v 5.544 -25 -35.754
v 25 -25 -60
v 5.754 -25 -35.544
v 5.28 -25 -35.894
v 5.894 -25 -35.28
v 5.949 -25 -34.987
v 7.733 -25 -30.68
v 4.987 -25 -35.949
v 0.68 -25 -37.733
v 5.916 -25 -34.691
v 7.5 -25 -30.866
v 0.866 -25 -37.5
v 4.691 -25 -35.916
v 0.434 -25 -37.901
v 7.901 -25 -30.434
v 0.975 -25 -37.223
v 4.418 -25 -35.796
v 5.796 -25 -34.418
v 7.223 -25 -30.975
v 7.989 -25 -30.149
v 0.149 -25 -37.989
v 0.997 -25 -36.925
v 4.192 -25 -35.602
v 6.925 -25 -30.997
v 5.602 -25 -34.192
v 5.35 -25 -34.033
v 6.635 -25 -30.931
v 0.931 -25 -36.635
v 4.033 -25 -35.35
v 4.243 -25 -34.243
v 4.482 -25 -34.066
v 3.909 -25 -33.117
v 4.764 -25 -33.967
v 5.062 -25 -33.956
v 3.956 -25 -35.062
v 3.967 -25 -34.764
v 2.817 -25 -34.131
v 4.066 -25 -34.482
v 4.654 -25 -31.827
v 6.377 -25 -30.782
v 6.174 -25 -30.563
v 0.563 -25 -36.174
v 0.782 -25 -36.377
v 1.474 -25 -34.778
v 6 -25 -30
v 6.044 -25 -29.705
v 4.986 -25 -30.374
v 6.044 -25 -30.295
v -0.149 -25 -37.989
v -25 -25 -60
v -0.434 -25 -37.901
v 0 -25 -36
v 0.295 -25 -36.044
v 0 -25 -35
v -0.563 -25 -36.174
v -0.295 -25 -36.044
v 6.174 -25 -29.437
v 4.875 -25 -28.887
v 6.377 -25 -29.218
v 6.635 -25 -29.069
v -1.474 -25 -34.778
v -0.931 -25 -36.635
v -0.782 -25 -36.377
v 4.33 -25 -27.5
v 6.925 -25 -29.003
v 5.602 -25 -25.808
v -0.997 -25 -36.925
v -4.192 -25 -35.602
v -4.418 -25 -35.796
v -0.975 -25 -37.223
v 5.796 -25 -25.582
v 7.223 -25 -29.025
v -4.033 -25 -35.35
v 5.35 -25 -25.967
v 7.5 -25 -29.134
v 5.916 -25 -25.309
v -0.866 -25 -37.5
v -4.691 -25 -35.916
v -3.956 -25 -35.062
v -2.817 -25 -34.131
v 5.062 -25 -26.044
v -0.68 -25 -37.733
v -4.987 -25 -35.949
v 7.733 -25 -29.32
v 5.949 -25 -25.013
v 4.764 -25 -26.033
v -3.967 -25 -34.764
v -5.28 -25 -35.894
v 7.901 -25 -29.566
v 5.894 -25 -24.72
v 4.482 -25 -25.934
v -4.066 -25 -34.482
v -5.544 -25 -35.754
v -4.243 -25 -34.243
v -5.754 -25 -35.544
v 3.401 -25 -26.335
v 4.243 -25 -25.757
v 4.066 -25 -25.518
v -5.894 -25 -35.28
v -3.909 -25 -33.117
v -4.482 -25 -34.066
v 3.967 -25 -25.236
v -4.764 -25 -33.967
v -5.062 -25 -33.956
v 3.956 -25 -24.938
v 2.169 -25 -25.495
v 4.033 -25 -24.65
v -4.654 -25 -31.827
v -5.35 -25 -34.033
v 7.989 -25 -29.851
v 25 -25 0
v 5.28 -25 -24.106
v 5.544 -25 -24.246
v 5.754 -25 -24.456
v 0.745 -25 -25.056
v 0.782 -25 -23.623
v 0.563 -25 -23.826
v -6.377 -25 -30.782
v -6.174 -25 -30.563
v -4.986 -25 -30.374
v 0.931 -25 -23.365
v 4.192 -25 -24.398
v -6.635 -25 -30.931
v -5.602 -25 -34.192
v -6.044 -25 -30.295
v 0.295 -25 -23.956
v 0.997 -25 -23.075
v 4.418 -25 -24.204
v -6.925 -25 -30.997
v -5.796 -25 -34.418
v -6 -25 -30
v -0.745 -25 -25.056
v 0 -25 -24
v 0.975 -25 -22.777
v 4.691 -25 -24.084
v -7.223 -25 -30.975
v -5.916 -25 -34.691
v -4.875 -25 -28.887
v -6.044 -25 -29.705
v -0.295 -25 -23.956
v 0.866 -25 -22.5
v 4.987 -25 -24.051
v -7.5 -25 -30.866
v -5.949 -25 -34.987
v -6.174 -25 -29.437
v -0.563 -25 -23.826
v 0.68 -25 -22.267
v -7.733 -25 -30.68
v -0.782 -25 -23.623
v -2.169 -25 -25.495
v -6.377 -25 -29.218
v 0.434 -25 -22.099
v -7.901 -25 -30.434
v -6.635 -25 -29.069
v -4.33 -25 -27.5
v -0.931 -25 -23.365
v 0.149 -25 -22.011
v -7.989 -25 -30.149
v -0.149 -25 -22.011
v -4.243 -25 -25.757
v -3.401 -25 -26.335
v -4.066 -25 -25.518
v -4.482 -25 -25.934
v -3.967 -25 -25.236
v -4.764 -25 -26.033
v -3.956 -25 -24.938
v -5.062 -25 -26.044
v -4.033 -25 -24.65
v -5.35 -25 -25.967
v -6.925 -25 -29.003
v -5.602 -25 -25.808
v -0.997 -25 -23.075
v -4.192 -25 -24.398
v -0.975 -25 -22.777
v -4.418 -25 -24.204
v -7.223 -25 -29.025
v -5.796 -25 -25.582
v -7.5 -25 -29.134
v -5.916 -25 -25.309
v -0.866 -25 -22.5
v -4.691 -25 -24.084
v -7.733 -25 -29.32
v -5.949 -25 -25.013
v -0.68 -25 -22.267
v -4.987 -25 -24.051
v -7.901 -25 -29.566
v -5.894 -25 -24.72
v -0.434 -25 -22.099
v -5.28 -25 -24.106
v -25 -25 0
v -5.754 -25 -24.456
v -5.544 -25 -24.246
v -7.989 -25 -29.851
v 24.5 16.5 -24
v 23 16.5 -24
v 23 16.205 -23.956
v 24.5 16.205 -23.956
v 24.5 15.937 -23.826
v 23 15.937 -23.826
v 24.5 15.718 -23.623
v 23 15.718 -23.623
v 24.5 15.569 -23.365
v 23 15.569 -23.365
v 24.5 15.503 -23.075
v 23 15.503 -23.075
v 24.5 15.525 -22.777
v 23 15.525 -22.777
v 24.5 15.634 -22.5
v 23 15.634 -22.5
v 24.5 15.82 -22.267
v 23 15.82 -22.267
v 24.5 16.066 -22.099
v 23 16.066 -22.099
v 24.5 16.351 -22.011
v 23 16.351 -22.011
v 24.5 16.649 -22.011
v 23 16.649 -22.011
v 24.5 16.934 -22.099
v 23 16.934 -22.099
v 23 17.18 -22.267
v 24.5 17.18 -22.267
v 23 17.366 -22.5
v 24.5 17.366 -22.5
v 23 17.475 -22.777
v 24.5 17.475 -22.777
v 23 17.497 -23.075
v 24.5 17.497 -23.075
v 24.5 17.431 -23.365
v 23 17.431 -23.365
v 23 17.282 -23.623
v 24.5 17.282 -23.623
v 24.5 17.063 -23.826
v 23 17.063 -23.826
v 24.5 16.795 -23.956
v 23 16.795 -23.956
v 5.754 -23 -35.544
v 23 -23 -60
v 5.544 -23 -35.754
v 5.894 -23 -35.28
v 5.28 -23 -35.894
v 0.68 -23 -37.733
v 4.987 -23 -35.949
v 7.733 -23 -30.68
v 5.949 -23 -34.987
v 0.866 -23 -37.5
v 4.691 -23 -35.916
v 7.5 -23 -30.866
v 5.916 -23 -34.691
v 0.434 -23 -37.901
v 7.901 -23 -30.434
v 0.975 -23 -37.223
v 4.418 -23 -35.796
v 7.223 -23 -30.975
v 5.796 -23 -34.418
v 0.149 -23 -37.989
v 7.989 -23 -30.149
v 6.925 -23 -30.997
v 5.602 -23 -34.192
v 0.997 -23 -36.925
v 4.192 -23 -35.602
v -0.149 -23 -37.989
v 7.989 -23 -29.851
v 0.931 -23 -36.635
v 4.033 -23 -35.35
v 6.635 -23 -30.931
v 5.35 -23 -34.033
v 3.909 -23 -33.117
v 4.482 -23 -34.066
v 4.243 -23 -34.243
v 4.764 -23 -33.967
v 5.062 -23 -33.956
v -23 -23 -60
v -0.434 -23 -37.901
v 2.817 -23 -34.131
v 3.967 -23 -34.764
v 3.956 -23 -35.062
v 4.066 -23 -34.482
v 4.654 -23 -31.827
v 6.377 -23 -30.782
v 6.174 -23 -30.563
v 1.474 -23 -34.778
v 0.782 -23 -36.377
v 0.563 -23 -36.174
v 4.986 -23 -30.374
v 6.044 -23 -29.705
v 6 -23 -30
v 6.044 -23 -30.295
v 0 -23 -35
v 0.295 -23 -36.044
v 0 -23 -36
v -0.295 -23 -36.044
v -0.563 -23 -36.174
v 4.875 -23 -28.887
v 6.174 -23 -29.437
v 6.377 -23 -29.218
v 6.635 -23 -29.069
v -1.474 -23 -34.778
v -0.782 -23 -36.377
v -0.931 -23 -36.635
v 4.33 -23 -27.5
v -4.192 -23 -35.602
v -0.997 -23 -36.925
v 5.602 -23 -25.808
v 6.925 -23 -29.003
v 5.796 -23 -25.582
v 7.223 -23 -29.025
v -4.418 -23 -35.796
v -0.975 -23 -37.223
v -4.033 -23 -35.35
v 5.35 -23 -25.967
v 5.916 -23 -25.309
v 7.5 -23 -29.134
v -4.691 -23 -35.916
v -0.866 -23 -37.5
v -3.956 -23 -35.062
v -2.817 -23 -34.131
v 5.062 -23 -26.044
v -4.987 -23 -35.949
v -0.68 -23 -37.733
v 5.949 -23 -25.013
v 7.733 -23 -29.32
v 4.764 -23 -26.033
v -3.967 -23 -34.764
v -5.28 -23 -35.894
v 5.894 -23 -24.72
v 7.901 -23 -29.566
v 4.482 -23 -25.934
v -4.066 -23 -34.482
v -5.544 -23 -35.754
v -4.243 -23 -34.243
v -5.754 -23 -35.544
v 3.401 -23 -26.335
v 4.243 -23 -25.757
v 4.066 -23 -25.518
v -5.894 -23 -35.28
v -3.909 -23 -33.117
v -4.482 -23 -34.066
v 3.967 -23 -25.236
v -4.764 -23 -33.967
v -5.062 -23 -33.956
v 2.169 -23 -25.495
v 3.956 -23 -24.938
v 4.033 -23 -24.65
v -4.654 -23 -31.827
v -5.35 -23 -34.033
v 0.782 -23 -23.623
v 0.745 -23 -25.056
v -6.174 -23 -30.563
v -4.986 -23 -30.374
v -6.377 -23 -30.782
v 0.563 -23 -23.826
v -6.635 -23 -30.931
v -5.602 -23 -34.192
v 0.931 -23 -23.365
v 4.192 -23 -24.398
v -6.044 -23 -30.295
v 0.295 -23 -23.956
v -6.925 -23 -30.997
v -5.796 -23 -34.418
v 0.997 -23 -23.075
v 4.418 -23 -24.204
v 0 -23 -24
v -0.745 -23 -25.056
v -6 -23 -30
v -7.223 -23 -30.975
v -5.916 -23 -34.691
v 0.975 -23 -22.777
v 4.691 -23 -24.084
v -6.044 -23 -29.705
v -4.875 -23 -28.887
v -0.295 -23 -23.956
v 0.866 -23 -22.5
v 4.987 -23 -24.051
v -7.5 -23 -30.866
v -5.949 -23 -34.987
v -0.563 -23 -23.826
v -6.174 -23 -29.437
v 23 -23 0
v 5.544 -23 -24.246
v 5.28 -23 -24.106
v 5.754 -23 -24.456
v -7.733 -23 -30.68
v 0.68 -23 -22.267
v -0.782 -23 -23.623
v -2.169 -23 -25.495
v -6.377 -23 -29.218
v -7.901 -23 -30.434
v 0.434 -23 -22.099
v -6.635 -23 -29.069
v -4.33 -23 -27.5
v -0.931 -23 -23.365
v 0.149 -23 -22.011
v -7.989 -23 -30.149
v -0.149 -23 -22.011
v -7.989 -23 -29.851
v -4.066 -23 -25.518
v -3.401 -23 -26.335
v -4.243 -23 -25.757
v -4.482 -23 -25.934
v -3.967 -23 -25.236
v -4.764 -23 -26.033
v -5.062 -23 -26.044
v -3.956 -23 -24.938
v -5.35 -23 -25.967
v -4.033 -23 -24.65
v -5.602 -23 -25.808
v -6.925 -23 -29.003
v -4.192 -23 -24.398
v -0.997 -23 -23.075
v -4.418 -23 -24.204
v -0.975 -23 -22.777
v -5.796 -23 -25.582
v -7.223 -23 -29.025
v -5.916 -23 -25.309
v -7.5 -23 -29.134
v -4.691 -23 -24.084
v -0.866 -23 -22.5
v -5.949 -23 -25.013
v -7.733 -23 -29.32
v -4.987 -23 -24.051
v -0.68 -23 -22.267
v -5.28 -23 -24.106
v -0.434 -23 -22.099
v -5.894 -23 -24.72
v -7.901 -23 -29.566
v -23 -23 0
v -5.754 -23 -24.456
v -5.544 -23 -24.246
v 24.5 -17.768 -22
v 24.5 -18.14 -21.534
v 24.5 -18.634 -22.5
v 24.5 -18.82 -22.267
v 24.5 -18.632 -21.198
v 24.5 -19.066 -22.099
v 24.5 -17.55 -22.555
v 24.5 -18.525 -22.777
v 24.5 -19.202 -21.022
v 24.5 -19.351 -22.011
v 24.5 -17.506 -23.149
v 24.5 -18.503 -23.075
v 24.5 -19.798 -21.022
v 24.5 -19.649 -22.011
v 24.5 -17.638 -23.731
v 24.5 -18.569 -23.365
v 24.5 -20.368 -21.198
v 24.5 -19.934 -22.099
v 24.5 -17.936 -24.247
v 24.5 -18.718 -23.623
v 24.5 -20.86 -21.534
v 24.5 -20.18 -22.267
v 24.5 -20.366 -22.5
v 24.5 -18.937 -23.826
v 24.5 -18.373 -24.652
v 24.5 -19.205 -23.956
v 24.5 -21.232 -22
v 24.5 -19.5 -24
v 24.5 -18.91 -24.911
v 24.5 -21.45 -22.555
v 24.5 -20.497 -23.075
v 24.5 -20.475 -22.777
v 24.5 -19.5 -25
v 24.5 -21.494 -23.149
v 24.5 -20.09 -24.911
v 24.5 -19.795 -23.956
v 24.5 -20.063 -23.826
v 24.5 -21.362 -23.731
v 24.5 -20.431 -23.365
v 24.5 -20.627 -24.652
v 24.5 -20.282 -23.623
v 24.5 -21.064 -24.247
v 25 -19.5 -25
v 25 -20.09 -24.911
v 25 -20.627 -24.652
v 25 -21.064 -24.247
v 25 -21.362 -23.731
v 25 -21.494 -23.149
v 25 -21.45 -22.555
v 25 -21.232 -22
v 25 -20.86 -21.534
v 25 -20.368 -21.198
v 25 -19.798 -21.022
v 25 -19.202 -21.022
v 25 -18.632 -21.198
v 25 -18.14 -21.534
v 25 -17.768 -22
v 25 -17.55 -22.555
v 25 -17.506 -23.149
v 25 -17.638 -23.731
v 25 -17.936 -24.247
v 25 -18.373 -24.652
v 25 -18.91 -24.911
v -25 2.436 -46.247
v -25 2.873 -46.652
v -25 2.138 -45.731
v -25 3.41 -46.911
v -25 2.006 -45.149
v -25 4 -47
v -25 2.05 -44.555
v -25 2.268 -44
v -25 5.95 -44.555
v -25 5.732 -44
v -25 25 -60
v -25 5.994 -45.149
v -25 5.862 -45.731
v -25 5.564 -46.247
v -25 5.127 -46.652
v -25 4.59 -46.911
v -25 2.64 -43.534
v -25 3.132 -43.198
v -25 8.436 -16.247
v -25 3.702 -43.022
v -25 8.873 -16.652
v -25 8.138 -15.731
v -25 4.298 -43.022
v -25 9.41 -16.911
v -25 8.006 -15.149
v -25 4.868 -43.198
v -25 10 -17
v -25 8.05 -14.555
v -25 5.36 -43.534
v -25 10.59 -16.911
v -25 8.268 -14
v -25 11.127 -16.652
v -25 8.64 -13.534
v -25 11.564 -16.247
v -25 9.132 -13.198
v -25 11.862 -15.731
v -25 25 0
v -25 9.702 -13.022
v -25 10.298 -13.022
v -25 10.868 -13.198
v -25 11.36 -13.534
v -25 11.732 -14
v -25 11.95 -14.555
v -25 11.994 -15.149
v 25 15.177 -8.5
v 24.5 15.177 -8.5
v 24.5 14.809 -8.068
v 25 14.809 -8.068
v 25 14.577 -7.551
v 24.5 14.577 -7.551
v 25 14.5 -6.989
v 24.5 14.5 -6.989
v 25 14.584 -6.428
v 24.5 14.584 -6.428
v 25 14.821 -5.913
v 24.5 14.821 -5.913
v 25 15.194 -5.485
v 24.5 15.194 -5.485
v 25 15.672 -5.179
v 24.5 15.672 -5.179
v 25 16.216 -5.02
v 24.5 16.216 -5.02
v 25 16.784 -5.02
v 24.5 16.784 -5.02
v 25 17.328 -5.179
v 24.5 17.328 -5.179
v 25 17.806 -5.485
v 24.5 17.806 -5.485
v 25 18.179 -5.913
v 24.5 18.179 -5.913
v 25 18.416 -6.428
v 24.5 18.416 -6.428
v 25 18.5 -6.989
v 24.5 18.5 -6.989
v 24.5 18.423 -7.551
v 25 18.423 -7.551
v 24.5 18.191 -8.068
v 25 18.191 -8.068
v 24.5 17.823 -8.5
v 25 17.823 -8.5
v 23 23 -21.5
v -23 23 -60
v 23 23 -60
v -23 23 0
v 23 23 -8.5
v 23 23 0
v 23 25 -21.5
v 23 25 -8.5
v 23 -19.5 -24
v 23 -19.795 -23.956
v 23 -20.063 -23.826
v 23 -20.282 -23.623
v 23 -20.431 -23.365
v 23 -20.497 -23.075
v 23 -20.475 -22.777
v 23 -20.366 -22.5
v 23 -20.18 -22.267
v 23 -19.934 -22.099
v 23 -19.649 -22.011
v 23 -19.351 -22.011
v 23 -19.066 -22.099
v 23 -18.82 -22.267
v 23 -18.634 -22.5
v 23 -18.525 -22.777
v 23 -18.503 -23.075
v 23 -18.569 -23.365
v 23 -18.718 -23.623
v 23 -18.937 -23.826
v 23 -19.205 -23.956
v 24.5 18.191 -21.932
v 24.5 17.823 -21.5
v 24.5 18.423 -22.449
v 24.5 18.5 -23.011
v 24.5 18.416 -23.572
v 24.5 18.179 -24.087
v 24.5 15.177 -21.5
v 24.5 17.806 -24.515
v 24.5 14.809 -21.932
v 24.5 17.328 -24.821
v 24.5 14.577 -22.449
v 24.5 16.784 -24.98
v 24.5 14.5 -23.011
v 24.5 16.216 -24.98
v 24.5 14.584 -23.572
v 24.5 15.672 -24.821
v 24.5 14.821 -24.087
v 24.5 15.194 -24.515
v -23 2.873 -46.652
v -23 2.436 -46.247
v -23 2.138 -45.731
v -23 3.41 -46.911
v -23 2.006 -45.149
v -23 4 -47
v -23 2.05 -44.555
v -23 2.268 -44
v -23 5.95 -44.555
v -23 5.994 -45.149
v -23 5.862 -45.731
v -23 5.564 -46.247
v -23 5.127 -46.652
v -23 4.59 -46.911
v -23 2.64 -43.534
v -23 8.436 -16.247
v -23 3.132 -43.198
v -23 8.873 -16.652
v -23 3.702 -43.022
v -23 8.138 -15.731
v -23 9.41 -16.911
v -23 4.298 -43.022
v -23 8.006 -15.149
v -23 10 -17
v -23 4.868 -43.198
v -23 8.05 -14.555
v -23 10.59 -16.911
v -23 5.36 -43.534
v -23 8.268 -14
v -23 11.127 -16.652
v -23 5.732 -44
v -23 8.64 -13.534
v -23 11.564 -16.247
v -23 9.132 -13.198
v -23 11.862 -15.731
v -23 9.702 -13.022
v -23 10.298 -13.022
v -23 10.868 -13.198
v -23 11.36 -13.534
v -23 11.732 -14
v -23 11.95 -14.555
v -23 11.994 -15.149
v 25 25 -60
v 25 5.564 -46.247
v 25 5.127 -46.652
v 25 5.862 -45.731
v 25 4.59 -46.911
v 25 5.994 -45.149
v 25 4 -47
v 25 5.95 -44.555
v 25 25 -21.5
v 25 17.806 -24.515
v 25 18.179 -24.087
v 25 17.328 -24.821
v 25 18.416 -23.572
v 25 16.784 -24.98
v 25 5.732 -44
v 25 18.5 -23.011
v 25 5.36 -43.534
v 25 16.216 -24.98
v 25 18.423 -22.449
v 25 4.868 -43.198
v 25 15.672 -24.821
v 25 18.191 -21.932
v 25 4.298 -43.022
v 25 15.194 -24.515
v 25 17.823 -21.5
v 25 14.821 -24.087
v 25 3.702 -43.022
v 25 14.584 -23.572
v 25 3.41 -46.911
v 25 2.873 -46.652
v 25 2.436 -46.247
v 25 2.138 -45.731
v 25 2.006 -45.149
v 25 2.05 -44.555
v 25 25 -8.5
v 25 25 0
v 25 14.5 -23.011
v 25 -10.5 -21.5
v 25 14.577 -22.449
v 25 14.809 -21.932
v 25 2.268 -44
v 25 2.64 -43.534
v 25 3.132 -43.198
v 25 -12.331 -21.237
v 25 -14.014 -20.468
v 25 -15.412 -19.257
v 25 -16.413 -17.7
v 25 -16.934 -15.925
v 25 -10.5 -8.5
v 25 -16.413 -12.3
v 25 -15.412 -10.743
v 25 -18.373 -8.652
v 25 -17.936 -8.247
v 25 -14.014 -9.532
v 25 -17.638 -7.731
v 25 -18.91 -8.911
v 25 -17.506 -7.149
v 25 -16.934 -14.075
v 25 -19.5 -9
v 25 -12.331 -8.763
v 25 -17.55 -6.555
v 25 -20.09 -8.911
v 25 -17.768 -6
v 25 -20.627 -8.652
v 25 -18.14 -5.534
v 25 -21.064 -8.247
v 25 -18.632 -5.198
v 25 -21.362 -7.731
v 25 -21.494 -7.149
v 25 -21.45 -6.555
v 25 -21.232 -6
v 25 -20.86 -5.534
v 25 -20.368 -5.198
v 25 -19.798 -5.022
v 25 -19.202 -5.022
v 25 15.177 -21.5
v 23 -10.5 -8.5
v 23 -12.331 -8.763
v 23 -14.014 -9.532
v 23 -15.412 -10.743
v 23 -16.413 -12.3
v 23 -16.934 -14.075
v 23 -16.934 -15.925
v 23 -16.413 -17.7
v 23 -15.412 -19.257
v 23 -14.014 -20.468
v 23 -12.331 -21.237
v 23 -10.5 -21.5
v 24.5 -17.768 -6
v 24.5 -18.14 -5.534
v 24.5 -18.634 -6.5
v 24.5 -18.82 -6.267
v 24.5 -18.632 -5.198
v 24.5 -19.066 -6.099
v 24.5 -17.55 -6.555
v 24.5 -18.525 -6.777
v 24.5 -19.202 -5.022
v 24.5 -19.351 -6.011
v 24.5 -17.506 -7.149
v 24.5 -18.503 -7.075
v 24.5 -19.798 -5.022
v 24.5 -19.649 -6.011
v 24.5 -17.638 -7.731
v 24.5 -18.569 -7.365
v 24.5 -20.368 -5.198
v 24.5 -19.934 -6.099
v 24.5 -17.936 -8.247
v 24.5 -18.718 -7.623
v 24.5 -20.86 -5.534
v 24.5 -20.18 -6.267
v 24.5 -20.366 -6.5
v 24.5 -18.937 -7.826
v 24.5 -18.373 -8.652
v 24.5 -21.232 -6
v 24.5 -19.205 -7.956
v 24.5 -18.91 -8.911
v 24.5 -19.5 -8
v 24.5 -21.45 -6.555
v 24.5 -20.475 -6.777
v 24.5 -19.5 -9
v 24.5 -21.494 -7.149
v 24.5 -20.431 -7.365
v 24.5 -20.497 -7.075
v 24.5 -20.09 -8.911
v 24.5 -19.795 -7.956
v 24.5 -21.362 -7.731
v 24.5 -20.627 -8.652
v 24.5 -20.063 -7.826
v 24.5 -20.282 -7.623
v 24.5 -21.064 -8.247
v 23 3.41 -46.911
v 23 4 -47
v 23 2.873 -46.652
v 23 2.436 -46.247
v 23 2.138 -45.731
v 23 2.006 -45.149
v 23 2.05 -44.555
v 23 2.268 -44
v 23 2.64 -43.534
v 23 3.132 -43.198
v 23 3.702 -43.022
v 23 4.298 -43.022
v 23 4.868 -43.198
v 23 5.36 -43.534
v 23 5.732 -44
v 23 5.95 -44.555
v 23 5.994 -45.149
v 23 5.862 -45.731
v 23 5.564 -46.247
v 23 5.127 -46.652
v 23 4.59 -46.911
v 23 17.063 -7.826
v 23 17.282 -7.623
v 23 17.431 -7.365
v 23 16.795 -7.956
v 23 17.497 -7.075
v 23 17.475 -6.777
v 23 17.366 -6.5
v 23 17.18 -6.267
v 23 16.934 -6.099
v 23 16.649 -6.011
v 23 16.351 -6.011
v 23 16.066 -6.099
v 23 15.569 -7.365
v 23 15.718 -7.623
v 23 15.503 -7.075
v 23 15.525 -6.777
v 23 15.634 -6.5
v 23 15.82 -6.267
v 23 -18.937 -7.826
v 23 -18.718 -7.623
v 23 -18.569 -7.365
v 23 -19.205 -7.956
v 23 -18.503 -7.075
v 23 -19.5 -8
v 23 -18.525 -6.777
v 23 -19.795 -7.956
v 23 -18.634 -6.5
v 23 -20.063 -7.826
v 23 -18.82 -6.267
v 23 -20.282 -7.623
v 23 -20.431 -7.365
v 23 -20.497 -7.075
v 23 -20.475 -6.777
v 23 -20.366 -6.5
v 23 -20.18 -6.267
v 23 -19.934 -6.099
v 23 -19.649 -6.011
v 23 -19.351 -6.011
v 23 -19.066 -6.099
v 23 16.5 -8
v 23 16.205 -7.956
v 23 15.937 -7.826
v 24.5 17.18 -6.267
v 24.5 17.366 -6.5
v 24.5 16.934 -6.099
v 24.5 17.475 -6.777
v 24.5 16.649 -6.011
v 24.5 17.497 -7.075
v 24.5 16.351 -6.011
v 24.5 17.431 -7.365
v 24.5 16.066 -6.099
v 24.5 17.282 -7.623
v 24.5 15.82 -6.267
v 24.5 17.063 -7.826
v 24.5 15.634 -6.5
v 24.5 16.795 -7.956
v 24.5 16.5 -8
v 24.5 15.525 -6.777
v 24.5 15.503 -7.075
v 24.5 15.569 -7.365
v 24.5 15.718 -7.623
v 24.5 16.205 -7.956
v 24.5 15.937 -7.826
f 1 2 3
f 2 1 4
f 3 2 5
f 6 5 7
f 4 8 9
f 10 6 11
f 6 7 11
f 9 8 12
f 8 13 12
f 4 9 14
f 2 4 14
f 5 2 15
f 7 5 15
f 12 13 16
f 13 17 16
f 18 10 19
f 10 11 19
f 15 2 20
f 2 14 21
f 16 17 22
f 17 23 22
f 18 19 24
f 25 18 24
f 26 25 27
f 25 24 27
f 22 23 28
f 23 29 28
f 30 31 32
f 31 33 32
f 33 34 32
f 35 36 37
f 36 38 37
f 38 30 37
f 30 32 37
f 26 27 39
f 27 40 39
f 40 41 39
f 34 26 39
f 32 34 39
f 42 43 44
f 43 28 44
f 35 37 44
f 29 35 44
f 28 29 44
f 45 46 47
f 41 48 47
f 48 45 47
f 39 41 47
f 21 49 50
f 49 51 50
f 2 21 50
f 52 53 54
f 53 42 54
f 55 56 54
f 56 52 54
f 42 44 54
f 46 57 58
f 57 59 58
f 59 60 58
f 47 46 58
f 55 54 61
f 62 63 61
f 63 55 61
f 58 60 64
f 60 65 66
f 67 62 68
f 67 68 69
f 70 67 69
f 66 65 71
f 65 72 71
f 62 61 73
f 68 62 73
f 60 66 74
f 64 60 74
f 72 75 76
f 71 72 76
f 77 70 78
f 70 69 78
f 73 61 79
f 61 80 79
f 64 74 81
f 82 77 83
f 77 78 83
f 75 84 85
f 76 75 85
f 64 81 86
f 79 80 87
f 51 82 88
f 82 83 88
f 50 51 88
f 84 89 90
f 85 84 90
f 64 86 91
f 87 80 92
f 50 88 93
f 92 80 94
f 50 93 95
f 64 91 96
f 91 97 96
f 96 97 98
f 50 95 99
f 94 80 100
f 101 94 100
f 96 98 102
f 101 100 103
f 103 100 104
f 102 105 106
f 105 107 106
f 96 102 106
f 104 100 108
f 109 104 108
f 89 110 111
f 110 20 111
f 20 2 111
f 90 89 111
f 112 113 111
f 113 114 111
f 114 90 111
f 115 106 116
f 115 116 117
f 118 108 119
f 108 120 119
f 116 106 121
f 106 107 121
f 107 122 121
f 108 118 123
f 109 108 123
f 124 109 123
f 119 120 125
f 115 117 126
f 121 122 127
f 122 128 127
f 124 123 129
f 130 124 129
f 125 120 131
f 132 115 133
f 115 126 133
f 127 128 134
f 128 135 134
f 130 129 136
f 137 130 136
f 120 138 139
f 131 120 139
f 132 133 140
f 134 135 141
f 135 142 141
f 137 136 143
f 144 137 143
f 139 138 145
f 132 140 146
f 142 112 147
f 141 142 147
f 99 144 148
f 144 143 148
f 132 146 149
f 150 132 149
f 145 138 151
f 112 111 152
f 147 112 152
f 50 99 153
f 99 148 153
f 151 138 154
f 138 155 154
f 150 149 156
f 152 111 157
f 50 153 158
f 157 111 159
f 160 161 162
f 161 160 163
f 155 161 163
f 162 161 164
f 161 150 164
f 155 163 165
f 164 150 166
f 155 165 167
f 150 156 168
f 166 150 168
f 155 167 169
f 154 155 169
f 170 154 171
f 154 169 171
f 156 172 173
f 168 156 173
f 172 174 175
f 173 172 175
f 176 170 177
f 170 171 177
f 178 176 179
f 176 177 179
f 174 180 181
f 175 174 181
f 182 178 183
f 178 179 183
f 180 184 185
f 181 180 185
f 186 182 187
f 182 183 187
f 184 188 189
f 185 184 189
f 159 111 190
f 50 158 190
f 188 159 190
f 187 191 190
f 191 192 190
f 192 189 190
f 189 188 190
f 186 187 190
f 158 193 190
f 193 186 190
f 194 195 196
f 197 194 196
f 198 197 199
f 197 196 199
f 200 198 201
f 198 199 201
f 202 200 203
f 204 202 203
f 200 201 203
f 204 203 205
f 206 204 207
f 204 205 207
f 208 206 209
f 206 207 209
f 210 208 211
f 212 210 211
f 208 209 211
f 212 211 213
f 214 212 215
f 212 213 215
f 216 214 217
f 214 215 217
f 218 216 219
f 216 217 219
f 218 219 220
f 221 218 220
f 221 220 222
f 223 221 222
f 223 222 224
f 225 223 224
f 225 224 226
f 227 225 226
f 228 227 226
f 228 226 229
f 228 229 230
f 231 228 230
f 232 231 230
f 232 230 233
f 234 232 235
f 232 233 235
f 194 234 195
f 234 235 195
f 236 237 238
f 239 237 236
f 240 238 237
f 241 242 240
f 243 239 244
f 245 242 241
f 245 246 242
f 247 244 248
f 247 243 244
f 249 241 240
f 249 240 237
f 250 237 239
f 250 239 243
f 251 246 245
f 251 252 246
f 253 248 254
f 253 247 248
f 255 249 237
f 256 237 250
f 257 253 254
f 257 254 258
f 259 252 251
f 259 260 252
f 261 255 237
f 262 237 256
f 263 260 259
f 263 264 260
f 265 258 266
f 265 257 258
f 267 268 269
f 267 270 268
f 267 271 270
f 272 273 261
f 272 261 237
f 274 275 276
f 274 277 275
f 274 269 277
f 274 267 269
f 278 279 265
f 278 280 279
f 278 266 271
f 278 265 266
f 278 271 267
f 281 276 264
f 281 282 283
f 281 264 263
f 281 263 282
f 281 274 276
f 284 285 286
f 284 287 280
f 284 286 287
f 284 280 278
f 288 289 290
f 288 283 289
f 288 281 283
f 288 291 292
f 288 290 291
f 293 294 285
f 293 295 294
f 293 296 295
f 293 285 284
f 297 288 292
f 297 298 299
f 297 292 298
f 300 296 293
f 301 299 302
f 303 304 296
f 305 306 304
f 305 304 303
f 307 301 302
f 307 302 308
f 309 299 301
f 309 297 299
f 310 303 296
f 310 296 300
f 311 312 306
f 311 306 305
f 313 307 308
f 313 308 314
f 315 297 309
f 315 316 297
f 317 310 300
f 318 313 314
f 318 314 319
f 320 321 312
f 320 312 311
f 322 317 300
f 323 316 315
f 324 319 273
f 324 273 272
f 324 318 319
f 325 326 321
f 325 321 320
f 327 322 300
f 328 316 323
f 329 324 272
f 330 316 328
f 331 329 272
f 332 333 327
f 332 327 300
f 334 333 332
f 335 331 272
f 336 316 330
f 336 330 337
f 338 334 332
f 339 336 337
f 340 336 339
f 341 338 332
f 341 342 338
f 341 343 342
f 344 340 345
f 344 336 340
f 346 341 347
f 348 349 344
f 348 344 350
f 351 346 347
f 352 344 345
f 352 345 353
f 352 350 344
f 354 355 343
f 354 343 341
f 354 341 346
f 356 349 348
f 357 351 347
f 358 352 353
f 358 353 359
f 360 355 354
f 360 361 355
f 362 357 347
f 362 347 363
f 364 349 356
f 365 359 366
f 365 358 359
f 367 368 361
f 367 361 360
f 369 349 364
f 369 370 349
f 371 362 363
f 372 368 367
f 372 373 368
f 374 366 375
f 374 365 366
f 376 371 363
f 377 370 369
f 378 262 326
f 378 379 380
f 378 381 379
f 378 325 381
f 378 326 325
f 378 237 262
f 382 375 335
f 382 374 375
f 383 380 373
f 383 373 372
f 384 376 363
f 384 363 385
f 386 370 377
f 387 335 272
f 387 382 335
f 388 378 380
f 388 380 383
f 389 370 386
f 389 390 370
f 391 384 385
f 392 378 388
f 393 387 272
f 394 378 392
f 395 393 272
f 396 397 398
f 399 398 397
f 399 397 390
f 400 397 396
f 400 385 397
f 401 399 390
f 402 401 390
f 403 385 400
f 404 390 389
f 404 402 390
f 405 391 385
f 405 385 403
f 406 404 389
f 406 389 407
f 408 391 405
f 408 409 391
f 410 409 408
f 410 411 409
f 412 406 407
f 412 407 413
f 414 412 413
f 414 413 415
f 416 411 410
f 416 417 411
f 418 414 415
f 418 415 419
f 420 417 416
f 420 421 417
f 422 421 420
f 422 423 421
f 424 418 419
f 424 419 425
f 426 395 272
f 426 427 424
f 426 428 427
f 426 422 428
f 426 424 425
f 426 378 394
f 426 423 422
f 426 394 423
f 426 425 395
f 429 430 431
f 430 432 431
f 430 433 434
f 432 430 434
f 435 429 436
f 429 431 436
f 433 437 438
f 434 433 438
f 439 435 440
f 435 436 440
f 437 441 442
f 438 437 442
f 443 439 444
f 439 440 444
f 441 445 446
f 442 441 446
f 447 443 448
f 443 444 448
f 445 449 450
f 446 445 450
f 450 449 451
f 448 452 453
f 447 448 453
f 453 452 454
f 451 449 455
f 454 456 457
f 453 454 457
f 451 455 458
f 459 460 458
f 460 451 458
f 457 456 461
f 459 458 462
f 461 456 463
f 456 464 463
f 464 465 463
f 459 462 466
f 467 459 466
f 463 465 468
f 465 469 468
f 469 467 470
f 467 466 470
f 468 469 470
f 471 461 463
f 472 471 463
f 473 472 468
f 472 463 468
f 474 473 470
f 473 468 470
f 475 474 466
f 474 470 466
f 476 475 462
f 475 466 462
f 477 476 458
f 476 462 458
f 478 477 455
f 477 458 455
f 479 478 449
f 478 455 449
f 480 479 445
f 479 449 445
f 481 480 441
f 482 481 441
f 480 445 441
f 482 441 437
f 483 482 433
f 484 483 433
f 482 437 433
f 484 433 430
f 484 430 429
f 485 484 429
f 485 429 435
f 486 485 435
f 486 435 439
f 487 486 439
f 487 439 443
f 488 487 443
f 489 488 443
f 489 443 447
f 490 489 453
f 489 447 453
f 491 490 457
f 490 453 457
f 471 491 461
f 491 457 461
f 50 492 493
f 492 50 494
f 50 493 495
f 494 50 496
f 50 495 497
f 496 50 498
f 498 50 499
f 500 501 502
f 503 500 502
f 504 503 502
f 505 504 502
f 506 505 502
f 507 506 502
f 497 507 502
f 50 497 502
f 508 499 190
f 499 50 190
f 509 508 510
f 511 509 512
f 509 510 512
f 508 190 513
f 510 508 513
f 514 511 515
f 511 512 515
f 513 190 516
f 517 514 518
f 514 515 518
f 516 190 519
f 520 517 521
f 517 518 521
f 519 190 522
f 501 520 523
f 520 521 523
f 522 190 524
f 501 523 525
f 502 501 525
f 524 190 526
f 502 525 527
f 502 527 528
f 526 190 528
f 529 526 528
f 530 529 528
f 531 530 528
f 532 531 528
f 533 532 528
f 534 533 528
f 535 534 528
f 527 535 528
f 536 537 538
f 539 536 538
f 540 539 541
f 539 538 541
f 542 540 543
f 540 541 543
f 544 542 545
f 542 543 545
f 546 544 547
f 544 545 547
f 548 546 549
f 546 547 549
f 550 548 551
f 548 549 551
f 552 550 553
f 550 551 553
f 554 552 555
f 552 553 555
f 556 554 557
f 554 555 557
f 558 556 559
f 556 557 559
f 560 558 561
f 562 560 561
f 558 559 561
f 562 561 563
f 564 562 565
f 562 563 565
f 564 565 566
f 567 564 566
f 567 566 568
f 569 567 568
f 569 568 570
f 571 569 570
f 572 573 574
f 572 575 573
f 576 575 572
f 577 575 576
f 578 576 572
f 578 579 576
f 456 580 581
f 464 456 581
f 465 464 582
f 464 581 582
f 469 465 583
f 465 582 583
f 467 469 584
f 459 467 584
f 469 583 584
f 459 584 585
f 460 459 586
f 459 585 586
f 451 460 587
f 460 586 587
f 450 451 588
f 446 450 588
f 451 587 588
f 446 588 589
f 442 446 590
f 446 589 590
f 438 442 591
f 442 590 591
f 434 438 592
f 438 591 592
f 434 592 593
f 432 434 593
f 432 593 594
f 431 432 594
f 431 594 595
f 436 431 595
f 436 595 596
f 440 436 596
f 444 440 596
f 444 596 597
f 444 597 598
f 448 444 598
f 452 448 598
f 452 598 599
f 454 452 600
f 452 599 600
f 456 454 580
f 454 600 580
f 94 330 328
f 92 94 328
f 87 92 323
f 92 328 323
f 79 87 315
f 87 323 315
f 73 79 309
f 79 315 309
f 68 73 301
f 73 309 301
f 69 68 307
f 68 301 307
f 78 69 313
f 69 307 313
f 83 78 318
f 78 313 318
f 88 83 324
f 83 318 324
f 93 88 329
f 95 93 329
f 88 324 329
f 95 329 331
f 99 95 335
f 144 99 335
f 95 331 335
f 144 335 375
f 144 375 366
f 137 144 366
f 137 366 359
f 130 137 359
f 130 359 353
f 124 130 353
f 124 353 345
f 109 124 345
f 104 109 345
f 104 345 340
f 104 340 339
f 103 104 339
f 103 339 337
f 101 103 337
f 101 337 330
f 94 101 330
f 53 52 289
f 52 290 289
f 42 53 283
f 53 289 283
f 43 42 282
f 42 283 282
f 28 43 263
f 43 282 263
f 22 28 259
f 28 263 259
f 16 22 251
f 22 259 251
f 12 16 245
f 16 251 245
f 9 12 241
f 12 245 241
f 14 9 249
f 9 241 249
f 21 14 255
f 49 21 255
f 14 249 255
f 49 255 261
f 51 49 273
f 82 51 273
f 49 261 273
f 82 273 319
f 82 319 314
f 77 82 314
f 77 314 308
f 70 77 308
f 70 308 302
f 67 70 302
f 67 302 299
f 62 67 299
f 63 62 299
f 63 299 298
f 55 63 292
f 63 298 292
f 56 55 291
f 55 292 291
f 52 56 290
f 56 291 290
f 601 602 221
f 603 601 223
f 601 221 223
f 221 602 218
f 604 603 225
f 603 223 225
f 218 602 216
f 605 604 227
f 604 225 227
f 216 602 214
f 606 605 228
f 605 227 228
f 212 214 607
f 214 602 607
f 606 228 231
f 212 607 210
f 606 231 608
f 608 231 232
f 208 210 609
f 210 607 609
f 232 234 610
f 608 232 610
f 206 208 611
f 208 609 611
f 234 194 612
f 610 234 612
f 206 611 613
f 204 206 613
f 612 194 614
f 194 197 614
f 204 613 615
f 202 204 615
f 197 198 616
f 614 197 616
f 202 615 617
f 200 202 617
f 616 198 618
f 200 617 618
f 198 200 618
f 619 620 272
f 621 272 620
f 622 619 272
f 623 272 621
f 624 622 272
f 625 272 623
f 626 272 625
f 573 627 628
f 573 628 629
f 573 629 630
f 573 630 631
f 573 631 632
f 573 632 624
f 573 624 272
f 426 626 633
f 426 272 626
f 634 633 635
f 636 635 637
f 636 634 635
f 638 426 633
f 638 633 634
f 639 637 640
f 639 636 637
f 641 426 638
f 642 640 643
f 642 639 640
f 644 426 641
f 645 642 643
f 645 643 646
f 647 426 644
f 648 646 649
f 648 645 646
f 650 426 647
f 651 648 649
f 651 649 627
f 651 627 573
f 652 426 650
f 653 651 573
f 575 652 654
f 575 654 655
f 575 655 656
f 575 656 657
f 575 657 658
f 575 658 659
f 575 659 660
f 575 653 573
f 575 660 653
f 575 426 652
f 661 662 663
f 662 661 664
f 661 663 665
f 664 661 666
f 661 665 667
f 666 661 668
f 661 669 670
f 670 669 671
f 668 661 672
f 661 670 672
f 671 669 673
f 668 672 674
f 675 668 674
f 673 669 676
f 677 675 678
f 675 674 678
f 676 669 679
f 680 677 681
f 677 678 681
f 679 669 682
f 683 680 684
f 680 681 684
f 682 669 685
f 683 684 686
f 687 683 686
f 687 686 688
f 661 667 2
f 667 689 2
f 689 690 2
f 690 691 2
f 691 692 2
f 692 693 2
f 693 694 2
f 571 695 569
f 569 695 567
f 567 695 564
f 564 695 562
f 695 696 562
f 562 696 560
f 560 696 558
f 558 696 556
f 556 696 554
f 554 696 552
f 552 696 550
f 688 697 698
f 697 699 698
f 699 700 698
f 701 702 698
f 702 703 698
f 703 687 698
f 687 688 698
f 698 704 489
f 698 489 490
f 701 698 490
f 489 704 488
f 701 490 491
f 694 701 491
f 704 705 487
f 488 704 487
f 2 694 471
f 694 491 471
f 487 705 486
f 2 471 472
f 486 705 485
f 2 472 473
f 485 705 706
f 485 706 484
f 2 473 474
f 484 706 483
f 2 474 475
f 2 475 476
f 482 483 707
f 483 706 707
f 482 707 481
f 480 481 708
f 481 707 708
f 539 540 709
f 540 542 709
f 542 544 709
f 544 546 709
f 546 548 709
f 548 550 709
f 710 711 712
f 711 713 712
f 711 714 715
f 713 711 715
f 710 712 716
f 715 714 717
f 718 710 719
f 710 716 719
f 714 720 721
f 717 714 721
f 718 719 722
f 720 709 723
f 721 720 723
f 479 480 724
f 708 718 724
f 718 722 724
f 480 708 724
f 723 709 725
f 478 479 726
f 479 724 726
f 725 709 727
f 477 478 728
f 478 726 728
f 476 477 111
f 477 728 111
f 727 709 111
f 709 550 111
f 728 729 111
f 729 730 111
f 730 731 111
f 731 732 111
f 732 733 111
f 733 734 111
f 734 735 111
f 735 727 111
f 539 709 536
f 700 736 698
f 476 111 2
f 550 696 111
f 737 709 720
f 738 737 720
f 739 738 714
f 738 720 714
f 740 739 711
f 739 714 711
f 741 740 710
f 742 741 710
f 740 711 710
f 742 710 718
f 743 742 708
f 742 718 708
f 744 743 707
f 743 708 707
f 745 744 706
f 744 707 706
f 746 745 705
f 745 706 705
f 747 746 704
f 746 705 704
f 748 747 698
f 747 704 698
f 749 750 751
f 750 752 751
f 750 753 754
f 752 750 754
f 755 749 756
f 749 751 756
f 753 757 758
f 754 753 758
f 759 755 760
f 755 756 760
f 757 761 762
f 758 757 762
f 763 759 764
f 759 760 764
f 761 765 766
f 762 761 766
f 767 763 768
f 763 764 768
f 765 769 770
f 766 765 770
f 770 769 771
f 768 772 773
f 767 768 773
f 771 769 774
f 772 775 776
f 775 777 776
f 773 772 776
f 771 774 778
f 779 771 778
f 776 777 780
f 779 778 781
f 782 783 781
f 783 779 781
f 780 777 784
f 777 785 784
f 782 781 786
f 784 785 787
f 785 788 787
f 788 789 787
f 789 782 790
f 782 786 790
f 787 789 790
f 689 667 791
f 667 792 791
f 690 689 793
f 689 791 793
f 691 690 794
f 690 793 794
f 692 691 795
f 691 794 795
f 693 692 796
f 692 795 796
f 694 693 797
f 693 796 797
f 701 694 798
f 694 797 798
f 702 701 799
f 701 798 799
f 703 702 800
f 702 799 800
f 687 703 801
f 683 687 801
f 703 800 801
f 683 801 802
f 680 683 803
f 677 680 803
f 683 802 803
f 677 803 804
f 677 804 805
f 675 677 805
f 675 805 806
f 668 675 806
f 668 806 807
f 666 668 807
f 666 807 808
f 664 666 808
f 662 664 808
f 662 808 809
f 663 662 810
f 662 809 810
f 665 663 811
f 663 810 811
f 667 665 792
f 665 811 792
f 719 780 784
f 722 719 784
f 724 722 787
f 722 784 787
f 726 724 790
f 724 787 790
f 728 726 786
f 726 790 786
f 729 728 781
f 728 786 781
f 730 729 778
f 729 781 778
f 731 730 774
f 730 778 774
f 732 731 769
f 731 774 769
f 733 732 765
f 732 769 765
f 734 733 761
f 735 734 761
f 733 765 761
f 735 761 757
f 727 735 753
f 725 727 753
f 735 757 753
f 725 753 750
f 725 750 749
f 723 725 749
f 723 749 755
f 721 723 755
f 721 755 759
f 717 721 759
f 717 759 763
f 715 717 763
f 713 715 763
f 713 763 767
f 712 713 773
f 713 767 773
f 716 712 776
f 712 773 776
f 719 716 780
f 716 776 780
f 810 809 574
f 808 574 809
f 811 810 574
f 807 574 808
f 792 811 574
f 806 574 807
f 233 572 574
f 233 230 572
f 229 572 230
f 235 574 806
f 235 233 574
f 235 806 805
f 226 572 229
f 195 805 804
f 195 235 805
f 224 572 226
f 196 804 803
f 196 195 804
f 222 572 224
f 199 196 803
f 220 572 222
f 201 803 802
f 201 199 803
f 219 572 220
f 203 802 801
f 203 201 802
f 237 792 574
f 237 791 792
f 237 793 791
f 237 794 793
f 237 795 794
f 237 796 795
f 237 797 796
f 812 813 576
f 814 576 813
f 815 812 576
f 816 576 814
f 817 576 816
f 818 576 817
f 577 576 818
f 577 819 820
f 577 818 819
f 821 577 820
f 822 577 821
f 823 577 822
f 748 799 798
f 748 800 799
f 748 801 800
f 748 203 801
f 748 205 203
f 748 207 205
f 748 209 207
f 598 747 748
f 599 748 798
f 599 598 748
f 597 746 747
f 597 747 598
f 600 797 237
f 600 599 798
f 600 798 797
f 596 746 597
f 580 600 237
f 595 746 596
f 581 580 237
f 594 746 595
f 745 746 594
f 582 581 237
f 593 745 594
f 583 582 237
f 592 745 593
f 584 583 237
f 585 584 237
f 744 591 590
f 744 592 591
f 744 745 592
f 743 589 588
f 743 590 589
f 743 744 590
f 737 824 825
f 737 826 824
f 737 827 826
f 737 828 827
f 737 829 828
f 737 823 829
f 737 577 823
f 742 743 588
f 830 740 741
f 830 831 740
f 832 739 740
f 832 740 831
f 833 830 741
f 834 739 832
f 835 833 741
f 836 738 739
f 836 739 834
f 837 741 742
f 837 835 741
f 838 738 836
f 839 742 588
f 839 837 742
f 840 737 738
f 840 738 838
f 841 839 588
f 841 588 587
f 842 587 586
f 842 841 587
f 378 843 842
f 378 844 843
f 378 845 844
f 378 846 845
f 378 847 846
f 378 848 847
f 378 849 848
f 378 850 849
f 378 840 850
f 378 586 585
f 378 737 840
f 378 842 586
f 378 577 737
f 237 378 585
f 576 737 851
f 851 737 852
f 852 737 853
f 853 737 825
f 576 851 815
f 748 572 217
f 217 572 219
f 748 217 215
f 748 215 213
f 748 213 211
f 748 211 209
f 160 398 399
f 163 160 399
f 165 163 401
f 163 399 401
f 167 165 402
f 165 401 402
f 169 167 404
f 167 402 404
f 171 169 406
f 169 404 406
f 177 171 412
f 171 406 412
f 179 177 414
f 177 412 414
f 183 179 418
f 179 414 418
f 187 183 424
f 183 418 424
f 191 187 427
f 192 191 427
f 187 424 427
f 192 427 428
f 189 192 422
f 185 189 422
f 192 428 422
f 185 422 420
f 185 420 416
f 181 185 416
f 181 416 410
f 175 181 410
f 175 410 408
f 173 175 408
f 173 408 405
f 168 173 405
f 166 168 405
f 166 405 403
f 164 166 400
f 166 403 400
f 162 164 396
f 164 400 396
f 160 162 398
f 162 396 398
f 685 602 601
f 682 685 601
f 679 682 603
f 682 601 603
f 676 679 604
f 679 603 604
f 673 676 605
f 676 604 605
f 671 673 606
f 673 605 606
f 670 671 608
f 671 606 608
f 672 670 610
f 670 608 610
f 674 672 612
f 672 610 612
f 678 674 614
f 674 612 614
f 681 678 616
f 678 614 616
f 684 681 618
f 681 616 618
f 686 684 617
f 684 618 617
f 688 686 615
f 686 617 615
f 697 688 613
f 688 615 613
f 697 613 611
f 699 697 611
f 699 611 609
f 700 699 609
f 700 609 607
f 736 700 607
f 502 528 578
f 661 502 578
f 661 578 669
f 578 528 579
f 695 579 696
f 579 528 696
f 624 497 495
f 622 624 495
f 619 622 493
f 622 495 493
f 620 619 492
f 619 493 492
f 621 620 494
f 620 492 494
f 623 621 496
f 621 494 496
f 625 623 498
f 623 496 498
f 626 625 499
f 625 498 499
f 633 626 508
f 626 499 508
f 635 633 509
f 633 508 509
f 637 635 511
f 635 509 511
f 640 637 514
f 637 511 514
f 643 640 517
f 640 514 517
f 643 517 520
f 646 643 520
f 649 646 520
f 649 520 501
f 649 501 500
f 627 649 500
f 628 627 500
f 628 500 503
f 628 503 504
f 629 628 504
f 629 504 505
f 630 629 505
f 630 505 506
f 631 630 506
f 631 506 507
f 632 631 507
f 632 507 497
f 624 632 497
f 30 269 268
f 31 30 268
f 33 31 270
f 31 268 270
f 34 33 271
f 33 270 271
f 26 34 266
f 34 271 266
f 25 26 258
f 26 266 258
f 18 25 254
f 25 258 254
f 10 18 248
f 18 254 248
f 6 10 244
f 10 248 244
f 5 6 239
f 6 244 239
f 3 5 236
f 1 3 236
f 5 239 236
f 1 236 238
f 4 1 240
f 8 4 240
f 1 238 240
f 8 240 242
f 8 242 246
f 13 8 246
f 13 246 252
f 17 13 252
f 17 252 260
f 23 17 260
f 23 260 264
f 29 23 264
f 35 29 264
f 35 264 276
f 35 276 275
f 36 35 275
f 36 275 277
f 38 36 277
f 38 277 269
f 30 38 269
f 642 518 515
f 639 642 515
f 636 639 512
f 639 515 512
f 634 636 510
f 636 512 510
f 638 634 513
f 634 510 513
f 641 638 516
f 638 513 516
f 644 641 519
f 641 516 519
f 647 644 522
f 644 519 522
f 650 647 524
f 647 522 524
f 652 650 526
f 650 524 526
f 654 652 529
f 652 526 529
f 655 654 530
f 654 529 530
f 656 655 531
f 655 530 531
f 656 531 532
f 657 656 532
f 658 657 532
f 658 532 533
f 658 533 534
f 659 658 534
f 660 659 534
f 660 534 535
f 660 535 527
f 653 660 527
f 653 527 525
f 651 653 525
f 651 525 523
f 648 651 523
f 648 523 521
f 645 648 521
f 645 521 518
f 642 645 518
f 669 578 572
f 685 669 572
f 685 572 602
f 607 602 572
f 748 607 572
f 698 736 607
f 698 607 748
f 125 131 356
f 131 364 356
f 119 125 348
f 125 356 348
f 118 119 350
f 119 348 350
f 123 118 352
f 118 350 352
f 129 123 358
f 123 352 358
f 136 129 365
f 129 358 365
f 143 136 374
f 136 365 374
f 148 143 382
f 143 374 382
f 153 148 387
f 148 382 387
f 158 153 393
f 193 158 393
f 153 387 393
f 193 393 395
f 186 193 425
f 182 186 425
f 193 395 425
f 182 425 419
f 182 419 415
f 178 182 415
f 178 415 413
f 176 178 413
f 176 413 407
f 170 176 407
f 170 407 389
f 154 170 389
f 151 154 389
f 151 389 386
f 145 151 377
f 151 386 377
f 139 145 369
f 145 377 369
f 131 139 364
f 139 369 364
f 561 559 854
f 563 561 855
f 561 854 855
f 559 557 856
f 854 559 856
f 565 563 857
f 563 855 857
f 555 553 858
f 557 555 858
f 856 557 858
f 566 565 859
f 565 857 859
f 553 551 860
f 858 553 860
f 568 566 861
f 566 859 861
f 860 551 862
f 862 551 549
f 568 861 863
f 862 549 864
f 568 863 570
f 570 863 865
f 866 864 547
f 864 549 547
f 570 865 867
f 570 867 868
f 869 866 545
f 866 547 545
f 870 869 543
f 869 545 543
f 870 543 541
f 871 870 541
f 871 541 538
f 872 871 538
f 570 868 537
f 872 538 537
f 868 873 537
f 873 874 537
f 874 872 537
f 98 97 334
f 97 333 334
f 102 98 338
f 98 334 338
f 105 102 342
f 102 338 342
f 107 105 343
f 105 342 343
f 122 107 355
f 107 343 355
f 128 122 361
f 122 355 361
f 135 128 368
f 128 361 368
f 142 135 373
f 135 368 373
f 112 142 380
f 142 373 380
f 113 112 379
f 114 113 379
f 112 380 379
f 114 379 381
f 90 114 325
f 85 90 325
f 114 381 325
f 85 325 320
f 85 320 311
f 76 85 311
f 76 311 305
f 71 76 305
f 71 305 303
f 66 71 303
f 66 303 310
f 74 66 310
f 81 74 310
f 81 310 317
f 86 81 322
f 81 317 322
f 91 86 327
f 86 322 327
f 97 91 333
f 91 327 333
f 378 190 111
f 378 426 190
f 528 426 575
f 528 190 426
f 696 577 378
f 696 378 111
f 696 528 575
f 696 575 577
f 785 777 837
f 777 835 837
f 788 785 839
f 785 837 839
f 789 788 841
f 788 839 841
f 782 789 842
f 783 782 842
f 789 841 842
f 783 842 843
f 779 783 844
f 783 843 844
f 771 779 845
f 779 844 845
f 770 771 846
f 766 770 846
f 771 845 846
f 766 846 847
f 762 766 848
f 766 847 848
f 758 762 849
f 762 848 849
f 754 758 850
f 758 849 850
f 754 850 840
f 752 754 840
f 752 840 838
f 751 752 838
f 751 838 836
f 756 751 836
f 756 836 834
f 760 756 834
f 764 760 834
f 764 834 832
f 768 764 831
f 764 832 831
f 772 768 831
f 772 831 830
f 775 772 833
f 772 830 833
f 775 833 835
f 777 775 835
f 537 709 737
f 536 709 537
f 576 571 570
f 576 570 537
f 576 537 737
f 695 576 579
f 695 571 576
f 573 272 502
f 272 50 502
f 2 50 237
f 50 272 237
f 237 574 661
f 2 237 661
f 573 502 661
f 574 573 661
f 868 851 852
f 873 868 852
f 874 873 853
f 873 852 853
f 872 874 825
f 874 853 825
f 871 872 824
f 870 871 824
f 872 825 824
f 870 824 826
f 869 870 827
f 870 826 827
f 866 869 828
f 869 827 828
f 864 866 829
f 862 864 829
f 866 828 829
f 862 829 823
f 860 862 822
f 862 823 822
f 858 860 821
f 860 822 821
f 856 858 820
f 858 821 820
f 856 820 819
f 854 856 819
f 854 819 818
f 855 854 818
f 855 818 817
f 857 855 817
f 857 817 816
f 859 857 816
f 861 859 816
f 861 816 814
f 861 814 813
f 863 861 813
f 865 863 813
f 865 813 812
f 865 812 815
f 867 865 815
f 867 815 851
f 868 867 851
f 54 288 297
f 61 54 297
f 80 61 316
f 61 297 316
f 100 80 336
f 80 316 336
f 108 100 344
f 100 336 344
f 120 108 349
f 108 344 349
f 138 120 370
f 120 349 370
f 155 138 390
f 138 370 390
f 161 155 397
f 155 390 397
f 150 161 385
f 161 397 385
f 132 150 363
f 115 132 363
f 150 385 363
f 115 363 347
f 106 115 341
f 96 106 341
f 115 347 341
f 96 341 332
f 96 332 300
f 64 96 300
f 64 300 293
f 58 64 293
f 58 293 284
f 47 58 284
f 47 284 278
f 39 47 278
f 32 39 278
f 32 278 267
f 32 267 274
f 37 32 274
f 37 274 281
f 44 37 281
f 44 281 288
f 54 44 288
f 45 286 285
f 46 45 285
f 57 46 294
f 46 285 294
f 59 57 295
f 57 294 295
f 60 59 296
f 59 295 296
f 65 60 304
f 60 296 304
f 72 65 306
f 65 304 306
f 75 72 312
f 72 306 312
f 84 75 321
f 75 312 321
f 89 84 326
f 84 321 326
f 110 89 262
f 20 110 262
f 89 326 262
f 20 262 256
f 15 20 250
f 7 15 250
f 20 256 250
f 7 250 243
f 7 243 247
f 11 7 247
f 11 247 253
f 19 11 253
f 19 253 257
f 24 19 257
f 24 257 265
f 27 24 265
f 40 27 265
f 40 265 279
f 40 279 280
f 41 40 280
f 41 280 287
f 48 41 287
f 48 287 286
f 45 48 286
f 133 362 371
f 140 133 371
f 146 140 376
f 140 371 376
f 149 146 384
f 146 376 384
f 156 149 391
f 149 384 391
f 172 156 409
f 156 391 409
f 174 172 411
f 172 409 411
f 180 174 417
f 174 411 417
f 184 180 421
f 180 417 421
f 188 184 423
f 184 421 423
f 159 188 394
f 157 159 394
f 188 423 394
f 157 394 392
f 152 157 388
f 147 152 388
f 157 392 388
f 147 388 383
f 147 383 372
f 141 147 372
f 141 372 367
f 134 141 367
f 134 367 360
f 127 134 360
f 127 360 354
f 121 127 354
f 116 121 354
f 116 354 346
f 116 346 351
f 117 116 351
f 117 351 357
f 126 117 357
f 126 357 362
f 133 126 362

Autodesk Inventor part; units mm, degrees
ref_plane "YZ Plane" through (0, 0, 0) normal (1, 0, 0) x (0, 1, 0)
ref_plane "XZ Plane" through (0, 0, 0) normal (0, 1, 0) x (-1, 0, 0)
ref_plane "XY Plane" through (0, 0, 0) normal (0, 0, 1) x (1, 0, 0)
sketch "スケッチ1" plane through (0, 0, 0) normal (0, 0, 1) x (1, 0, 0)
  line L0 (-25, 25) -> (25, 25)
  line L1 (25, 25) -> (25, -25)
  line L2 (25, -25) -> (-25, -25)
  line L3 (-25, -25) -> (-25, 25)
  line L4 (-23, 23) -> (23, 23)
  line L5 (23, 23) -> (23, -23)
  line L6 (23, -23) -> (-23, -23)
  line L7 (-23, -23) -> (-23, 23)
  point P0 (0, 0)
  dimension "d0" = 23
  dimension "d1" = 25
  dimension "d2" = 50
  dimension "d3" = 46
  dimension "d4" = 46
  dimension "d5" = 50
  dimension "d6" = 23
  dimension "d7" = 25
extrude "押し出し1" add sketch "スケッチ1" against normal blind 60
sketch "スケッチ2" plane through (25, -25, 0) normal (1, 0, 0) x (0, 0, -1)
  line L0 (0, 50) -> (0, 0) projected
  line L1 (0, 0) -> (60, 0) projected
  circle A0 centre (15, 35) radius 2
  circle A1 centre (45, 29) radius 2
  point P0 (0, 25)
  dimension "d10" = 4
  dimension "d12" = 30
  dimension "d13" = 15
  dimension "d14" = 6
  dimension "d15" = 29
hole "穴1" at (25, 10, -15) at (25, 4, -45) direction (-1, 0, 0) diameter 4 end through all
sketch "スケッチ3" plane through (25, -25, 0) normal (1, 0, 0) x (0, 0, -1)
  circle A0 centre (15, 35) radius 2 projected
  line L0 (0, 50) -> (60, 50) projected
  line L1 (8.5, 50) -> (21.5, 50)
  line L2 (21.5, 50) -> (21.5, 14.5)
  line L3 (8.5, 14.5) -> (8.5, 50)
  arc A1 (8.5, 14.5) -> (21.5, 14.5) centre (15, 14.5) ccw
  circle A2 centre (45, 29) radius 2 projected
  point P0 (0, 25)
  dimension "d23" = 35.5
  dimension "d26" = 13
  dimension "d27" = 6.5
  dimension "d28" = 6.5
  dimension "d74" = 30
extrude "押し出し2" cut sketch "スケッチ3" against normal blind 2 contours L0 L2 A1 L3
sketch "スケッチ4" plane through (25, -25, 0) normal (1, 0, 0) x (0, 0, -1)
  line L0 (0, 50) -> (8.5, 50) projected
  line L1 (21.5, 50) -> (60, 50) projected
  circle A0 centre (7, 41.5) radius 1
  circle A1 centre (7, 5.5) radius 1
  circle A2 centre (23, 41.5) radius 1
  circle A3 centre (23, 5.5) radius 1
  arc A4 (8.5, 14.5) -> (21.5, 14.5) centre (15, 14.5) ccw projected
  point P0 (0, 25)
  dimension "d32" = 8.5
  dimension "d33" = 8.5
  dimension "d34" = 36
  dimension "d35" = 36
  dimension "d36" = 16
  dimension "d37" = 16
  dimension "d40" = 2
  dimension "d72" = 8
  dimension "d73" = 8
hole "穴2" at (25, 16.5, -7) at (25, 16.5, -23) at (25, -19.5, -7) at (25, -19.5, -23) direction (-1, 0, 0) diameter 2 depth 2 tip angle 118 counterbore diameter 4 counterbore depth 0.5
sketch "スケッチ5" plane through (-25, -25, 0) normal (0, -1, 0) x (1, 0, 0)
  line L0 (50, 0) -> (0, 0) projected
  line L1 (0, 0) -> (0, -60) projected
  circle A0 centre (25, -30) radius 5
  point P0 (25, 0)
  dimension "d48" = 25
  dimension "d49" = 30
  dimension "d50" = 10
hole "穴3" at (0, -25, -30) direction (0, 1, 0) diameter 10 depth 2 tip angle 118
sketch "スケッチ6" plane through (-25, -25, 0) normal (0, -1, 0) x (1, 0, 0)
  circle A0 centre (25, -30) radius 5 projected
  line L0 (0, 0) -> (0, -60) projected
  circle A1 centre (25, -23) radius 1
  point P0 (25, 0)
  dimension "d58" = 2
  dimension "d60" = 7
  dimension "d61" = 25
hole "穴4" at (0, -25, -23) direction (0, 1, 0) diameter 2 depth 2 tip angle 118
pattern_circular "円形状パターン1" count 8 over 360 about axis through (0, -24, -30) along (0, -1, 0) of "穴4"
properties part number "Arm_Bracket_2"
